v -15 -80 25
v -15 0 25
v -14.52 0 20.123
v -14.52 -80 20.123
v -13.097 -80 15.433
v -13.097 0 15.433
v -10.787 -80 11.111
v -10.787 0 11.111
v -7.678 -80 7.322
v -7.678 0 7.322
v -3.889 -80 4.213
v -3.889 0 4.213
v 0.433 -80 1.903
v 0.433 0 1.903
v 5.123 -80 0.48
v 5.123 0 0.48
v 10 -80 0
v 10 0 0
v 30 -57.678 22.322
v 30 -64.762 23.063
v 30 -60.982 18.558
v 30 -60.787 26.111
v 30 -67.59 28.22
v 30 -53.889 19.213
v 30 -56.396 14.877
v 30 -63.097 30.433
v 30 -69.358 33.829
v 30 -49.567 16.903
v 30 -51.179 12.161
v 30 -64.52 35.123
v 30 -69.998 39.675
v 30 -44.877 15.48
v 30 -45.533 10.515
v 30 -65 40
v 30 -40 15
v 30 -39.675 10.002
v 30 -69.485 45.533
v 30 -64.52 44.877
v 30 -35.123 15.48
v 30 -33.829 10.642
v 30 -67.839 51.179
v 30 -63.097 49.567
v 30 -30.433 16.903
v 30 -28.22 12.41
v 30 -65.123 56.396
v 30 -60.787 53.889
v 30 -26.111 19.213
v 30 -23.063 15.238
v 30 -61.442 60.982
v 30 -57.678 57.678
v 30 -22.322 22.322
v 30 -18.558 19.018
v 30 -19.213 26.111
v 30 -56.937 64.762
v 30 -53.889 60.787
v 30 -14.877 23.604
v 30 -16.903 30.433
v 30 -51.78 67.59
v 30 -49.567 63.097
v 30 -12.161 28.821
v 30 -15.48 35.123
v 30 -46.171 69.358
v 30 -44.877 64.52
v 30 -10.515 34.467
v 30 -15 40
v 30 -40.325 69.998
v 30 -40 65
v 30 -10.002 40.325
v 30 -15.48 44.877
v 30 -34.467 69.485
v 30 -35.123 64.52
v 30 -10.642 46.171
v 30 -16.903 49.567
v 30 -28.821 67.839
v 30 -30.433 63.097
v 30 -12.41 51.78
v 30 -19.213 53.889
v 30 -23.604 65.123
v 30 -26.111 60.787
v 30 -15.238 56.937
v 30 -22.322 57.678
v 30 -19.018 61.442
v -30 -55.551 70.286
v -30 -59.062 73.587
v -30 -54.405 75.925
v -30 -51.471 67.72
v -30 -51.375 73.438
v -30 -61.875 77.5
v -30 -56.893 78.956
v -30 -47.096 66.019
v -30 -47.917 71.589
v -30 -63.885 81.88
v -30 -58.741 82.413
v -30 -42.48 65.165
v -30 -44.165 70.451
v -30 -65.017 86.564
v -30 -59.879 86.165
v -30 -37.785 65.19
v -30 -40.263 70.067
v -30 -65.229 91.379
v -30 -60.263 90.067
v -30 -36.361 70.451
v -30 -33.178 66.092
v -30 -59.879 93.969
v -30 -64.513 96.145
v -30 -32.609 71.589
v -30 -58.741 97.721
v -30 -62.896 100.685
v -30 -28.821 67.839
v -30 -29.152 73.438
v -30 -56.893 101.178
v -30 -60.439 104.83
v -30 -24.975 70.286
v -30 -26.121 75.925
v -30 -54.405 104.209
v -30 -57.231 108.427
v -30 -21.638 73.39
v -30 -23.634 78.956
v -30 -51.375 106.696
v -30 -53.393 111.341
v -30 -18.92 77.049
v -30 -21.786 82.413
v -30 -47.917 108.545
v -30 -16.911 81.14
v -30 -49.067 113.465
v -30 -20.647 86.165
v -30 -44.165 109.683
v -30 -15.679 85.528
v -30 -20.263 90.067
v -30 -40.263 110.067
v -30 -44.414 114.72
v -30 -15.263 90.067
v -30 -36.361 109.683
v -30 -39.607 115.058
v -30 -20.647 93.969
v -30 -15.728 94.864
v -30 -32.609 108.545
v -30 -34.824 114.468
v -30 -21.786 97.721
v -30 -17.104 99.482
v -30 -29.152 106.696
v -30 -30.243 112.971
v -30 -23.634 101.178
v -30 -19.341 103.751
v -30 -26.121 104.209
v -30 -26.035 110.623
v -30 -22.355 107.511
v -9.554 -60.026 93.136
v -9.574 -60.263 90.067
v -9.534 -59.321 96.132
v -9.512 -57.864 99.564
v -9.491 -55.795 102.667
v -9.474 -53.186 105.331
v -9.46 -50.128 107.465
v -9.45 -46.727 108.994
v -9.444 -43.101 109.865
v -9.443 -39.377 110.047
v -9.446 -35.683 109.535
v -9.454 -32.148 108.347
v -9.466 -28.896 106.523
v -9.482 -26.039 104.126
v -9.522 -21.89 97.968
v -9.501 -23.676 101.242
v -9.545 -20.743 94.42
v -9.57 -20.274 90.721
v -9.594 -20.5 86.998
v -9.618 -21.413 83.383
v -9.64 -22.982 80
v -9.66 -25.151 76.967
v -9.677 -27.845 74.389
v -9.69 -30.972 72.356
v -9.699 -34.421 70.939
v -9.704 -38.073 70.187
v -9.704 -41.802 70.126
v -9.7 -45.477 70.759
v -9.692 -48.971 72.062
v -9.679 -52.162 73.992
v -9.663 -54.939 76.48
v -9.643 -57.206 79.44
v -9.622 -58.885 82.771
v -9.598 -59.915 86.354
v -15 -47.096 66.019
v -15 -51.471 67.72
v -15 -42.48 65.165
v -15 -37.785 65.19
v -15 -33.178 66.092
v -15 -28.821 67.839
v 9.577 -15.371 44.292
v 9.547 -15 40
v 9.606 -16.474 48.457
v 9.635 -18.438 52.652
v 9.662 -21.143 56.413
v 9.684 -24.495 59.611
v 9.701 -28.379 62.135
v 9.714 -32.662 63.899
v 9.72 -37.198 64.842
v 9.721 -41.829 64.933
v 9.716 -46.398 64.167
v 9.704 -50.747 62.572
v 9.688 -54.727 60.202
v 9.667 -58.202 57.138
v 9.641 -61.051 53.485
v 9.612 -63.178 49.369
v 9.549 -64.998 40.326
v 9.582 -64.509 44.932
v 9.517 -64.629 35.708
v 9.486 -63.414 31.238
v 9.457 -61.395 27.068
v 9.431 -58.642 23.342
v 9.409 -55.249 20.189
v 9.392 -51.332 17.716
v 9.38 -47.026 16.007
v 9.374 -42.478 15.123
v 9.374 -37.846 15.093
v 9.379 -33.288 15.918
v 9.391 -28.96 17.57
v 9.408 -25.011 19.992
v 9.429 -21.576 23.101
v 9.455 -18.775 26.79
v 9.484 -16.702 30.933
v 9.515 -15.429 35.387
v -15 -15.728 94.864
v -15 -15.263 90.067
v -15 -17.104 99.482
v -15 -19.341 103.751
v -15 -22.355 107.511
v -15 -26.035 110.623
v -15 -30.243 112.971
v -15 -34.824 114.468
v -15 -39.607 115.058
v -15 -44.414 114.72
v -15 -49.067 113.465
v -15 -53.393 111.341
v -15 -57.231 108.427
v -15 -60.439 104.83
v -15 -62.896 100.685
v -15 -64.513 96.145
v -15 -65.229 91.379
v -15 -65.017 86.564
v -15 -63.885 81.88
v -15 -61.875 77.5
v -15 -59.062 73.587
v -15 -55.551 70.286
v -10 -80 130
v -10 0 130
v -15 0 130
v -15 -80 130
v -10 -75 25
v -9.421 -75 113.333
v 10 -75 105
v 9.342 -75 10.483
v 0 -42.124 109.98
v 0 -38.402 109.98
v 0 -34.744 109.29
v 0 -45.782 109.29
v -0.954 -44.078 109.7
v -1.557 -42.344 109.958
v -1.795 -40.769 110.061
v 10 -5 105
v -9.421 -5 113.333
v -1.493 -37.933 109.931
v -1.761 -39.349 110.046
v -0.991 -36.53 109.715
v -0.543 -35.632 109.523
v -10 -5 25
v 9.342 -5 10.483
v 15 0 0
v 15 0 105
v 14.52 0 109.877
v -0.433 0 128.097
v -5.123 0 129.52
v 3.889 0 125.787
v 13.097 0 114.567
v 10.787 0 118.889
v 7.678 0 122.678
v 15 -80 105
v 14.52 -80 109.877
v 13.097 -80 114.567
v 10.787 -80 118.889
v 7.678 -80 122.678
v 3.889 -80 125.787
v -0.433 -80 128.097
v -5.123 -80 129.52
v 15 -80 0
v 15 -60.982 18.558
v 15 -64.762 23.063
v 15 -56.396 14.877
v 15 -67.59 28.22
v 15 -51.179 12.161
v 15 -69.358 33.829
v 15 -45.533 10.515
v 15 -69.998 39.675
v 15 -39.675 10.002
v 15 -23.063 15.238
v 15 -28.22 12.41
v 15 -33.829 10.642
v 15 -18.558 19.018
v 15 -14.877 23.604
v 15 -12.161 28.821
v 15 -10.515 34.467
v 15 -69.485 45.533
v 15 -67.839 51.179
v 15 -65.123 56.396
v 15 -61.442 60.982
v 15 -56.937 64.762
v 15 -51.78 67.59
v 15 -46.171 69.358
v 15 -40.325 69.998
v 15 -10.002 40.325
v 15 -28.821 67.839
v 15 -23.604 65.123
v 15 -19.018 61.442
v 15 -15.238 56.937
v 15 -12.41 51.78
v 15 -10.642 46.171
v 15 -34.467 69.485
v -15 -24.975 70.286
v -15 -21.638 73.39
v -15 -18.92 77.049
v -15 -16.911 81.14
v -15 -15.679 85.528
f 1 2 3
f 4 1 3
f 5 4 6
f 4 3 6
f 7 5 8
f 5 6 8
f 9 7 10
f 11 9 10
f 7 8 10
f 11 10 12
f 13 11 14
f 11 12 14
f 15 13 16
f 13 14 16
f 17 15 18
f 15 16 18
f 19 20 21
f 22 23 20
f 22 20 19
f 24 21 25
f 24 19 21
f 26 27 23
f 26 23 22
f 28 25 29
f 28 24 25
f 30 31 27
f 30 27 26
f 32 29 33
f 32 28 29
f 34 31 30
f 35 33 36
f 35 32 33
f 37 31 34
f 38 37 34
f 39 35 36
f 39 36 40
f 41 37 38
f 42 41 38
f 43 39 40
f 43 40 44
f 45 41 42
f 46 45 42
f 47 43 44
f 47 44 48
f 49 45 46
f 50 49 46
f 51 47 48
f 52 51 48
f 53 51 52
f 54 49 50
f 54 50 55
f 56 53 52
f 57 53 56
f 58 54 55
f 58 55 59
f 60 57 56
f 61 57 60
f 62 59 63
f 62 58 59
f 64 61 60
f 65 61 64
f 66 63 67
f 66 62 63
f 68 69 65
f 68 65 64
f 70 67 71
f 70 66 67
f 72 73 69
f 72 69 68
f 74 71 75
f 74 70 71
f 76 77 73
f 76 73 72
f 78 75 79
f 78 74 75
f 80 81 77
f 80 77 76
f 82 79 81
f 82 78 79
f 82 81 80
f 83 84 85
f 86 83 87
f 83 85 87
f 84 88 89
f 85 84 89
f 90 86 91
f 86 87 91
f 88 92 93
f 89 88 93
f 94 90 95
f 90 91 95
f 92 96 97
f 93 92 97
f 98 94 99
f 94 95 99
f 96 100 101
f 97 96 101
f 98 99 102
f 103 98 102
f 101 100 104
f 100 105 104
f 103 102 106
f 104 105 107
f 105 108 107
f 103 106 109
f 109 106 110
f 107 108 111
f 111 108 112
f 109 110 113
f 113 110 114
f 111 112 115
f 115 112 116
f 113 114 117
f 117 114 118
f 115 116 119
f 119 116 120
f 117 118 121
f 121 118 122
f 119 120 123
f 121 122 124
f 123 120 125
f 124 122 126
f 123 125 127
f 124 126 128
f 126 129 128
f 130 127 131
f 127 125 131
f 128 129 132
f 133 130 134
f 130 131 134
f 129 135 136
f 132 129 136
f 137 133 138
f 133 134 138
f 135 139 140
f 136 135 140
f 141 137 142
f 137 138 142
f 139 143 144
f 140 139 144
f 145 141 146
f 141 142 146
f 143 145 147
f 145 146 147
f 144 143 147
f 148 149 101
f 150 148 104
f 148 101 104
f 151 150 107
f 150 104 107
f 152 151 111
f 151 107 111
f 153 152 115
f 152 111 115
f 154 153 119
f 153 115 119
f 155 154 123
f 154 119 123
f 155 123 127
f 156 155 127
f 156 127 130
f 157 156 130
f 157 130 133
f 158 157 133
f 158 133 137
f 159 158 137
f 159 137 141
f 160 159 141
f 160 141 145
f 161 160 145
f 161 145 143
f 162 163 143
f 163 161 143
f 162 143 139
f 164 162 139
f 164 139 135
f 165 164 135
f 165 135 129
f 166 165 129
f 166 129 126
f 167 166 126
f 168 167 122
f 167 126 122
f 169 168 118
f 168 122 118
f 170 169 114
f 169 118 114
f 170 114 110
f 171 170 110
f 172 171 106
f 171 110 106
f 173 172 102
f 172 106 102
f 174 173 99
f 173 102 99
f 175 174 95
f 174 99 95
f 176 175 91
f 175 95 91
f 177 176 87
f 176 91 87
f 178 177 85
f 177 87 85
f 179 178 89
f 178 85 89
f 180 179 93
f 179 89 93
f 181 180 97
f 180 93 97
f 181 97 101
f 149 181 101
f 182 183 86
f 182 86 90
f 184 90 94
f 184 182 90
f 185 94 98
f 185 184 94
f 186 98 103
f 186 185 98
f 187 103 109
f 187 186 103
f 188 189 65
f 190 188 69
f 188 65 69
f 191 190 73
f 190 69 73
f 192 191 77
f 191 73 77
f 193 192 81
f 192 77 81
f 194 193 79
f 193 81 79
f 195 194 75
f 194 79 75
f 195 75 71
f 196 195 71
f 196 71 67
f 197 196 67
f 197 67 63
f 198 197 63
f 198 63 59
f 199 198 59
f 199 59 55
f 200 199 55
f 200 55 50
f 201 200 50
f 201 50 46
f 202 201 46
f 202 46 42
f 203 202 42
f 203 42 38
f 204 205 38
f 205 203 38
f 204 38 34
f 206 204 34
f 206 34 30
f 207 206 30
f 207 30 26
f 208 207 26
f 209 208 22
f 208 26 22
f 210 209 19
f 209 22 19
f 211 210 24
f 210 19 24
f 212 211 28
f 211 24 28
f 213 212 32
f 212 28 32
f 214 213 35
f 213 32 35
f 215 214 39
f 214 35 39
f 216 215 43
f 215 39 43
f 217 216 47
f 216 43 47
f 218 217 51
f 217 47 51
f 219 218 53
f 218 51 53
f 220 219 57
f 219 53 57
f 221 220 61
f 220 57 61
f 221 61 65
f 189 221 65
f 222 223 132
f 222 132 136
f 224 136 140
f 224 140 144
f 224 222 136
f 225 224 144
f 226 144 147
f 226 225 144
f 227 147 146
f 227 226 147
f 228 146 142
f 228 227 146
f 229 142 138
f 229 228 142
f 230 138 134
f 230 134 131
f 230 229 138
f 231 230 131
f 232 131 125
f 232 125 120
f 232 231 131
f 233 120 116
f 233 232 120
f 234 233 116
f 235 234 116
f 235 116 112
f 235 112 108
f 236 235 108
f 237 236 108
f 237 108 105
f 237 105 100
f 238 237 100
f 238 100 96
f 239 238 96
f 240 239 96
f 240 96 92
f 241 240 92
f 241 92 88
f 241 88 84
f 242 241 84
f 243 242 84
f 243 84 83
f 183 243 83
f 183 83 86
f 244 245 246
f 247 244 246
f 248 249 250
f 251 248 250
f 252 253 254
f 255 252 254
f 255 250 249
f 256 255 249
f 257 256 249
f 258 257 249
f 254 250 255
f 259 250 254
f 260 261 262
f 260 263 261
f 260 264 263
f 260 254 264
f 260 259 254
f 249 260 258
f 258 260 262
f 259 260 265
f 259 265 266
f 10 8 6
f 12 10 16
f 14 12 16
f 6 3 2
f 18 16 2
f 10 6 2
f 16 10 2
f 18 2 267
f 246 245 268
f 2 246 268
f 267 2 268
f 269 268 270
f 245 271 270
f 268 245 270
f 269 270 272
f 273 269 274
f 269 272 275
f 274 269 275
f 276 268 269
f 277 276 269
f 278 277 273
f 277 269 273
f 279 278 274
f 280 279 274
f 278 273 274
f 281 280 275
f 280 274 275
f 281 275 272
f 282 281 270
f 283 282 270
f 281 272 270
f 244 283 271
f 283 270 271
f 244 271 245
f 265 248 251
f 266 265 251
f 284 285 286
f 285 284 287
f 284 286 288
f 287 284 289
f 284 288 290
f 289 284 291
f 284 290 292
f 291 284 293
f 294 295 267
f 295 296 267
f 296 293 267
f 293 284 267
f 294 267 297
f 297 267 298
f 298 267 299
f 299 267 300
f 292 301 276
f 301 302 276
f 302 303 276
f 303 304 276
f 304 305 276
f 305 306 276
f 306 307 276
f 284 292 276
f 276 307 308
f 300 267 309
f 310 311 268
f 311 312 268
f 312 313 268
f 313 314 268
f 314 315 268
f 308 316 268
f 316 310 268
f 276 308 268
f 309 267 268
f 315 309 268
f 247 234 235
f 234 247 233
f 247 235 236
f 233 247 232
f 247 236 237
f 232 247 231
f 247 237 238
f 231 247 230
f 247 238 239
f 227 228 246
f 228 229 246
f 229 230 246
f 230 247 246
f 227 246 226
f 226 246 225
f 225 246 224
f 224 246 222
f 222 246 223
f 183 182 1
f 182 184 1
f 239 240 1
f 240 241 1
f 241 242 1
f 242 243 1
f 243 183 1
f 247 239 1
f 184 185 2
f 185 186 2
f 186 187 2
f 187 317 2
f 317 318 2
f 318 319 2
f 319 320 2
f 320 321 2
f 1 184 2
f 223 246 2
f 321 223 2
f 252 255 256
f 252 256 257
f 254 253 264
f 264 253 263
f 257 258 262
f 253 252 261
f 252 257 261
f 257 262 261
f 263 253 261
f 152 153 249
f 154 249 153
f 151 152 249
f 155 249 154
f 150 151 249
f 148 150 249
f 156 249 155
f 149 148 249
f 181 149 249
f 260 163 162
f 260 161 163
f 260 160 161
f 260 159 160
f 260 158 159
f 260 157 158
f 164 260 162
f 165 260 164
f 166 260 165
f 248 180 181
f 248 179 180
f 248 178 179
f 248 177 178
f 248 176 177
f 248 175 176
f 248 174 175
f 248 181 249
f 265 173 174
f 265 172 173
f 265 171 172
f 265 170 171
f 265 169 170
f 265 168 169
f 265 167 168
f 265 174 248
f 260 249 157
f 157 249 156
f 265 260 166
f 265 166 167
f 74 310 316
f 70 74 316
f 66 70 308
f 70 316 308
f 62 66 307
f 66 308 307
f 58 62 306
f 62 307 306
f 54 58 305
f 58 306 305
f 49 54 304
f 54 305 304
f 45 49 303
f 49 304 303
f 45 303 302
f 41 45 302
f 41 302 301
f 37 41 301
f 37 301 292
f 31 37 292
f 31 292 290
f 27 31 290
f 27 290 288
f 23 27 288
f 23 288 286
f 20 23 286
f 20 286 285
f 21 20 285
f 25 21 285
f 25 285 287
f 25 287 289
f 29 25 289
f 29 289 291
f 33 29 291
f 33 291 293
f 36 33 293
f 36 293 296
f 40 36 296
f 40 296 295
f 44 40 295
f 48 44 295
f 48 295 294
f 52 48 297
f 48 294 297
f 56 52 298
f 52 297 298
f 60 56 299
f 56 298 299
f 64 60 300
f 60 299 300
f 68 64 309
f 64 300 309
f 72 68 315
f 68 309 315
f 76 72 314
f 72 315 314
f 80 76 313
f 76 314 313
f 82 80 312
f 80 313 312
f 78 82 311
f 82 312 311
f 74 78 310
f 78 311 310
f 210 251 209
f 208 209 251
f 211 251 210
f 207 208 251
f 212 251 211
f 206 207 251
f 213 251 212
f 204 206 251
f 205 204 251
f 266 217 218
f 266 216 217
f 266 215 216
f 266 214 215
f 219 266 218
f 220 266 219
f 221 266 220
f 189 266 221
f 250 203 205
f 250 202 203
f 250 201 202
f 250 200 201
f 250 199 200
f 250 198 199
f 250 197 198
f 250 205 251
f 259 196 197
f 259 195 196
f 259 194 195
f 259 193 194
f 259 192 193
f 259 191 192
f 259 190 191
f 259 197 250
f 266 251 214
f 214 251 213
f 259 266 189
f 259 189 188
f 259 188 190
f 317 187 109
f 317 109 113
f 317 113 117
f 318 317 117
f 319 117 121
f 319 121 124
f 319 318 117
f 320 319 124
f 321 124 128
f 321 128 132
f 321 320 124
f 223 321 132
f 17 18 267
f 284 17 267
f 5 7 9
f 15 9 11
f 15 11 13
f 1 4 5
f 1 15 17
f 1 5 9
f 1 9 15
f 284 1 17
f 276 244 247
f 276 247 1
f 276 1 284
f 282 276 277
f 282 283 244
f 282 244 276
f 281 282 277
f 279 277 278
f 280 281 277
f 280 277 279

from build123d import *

# Parameters (mm, degrees)
F4_DEPTH  = 80
F7_DEPTH  = 30
F8_DEPTH  = 30
F9_DEPTH  = 70
F10_R     = 25
F11_DEPTH = 25
F12_R     = 20
F13_DEPTH = 30


with BuildPart() as f4:
    # F2 (on Front) → F4 (new body)
    with BuildSketch(Plane.XZ):
        with BuildLine():
            ThreePointArc((-15, 25), (-7.6776695297, 7.3223304703), (10, 0))
            Line((10, 0), (15, 0))
            Line((15, 0), (15, 105))
            ThreePointArc((15, 105), (7.6776695297, 122.6776695297), (-10, 130))
            Line((-10, 130), (-15, 130))
            Line((-15, 130), (-15, 25))
        make_face()
    extrude(amount=F4_DEPTH)

    # F3 (on Right) → F7 (join)
    with BuildSketch(Plane.YZ):
        with BuildLine():
            ThreePointArc((-51.4712392712, 67.720221312), (-40.1317472353, 65.0673444738), (-28.8207664845, 67.8392661183))
            ThreePointArc((-28.8207664845, 67.8392661183), (-40.1576697714, 69.9995856679), (-51.4712392712, 67.720221312))
        make_face()
        with BuildLine():
            ThreePointArc((-51.4712392712, 67.720221312), (-56.6712750242, 15.0586971257), (-10, 40))
            ThreePointArc((-10, 40), (-15.1466601292, 56.8021277601), (-28.8207664845, 67.8392661183))
            ThreePointArc((-28.8207664845, 67.8392661183), (-40.1317472353, 65.0673444738), (-51.4712392712, 67.720221312))
        make_face()
    extrude(amount=F7_DEPTH)

    # F3 (on Right) → F8 (join)
    with BuildSketch(Plane.YZ):
        with BuildLine():
            ThreePointArc((-51.4712392712, 67.720221312), (-40.1317472353, 65.0673444738), (-28.8207664845, 67.8392661183))
            ThreePointArc((-28.8207664845, 67.8392661183), (-40.1576697714, 69.9995856679), (-51.4712392712, 67.720221312))
        make_face()
        with BuildLine():
            ThreePointArc((-51.4712392712, 67.720221312), (-40.1576697714, 69.9995856679), (-28.8207664845, 67.8392661183))
            ThreePointArc((-28.8207664845, 67.8392661183), (-18.9199980607, 77.0489214909), (-15.2631387115, 90.066999197))
            ThreePointArc((-15.2631387115, 90.066999197), (-53.3932088942, 111.3414264983), (-51.4712392712, 67.720221312))
        make_face()
    extrude(amount=-F8_DEPTH)

    # F6 (on offset) → F9 (cut)
    with BuildSketch(Plane.XZ.offset(5)):
        Polygon((9.3415956944, 10.482782498), (10, 105), (-9.4214295968, 113.332554698), (-10, 25), align=None)
    extrude(amount=F9_DEPTH, mode=Mode.SUBTRACT)

    # F10 (on face) → F11 (cut)
    with BuildSketch(Plane.YZ.offset(30)):
        with Locations((-40, 40)):
            Circle(F10_R)
    extrude(amount=-F11_DEPTH, mode=Mode.SUBTRACT)

    # F12 (on face) → F13 (cut)
    with BuildSketch(Plane(origin=(-30, 0, 0), x_dir=(0, -1, 0), z_dir=(-1, 0, 0))):
        with Locations((40.2631387115, 90.066999197)):
            Circle(F12_R)
    extrude(amount=-F13_DEPTH, mode=Mode.SUBTRACT)


solid = f4.part
